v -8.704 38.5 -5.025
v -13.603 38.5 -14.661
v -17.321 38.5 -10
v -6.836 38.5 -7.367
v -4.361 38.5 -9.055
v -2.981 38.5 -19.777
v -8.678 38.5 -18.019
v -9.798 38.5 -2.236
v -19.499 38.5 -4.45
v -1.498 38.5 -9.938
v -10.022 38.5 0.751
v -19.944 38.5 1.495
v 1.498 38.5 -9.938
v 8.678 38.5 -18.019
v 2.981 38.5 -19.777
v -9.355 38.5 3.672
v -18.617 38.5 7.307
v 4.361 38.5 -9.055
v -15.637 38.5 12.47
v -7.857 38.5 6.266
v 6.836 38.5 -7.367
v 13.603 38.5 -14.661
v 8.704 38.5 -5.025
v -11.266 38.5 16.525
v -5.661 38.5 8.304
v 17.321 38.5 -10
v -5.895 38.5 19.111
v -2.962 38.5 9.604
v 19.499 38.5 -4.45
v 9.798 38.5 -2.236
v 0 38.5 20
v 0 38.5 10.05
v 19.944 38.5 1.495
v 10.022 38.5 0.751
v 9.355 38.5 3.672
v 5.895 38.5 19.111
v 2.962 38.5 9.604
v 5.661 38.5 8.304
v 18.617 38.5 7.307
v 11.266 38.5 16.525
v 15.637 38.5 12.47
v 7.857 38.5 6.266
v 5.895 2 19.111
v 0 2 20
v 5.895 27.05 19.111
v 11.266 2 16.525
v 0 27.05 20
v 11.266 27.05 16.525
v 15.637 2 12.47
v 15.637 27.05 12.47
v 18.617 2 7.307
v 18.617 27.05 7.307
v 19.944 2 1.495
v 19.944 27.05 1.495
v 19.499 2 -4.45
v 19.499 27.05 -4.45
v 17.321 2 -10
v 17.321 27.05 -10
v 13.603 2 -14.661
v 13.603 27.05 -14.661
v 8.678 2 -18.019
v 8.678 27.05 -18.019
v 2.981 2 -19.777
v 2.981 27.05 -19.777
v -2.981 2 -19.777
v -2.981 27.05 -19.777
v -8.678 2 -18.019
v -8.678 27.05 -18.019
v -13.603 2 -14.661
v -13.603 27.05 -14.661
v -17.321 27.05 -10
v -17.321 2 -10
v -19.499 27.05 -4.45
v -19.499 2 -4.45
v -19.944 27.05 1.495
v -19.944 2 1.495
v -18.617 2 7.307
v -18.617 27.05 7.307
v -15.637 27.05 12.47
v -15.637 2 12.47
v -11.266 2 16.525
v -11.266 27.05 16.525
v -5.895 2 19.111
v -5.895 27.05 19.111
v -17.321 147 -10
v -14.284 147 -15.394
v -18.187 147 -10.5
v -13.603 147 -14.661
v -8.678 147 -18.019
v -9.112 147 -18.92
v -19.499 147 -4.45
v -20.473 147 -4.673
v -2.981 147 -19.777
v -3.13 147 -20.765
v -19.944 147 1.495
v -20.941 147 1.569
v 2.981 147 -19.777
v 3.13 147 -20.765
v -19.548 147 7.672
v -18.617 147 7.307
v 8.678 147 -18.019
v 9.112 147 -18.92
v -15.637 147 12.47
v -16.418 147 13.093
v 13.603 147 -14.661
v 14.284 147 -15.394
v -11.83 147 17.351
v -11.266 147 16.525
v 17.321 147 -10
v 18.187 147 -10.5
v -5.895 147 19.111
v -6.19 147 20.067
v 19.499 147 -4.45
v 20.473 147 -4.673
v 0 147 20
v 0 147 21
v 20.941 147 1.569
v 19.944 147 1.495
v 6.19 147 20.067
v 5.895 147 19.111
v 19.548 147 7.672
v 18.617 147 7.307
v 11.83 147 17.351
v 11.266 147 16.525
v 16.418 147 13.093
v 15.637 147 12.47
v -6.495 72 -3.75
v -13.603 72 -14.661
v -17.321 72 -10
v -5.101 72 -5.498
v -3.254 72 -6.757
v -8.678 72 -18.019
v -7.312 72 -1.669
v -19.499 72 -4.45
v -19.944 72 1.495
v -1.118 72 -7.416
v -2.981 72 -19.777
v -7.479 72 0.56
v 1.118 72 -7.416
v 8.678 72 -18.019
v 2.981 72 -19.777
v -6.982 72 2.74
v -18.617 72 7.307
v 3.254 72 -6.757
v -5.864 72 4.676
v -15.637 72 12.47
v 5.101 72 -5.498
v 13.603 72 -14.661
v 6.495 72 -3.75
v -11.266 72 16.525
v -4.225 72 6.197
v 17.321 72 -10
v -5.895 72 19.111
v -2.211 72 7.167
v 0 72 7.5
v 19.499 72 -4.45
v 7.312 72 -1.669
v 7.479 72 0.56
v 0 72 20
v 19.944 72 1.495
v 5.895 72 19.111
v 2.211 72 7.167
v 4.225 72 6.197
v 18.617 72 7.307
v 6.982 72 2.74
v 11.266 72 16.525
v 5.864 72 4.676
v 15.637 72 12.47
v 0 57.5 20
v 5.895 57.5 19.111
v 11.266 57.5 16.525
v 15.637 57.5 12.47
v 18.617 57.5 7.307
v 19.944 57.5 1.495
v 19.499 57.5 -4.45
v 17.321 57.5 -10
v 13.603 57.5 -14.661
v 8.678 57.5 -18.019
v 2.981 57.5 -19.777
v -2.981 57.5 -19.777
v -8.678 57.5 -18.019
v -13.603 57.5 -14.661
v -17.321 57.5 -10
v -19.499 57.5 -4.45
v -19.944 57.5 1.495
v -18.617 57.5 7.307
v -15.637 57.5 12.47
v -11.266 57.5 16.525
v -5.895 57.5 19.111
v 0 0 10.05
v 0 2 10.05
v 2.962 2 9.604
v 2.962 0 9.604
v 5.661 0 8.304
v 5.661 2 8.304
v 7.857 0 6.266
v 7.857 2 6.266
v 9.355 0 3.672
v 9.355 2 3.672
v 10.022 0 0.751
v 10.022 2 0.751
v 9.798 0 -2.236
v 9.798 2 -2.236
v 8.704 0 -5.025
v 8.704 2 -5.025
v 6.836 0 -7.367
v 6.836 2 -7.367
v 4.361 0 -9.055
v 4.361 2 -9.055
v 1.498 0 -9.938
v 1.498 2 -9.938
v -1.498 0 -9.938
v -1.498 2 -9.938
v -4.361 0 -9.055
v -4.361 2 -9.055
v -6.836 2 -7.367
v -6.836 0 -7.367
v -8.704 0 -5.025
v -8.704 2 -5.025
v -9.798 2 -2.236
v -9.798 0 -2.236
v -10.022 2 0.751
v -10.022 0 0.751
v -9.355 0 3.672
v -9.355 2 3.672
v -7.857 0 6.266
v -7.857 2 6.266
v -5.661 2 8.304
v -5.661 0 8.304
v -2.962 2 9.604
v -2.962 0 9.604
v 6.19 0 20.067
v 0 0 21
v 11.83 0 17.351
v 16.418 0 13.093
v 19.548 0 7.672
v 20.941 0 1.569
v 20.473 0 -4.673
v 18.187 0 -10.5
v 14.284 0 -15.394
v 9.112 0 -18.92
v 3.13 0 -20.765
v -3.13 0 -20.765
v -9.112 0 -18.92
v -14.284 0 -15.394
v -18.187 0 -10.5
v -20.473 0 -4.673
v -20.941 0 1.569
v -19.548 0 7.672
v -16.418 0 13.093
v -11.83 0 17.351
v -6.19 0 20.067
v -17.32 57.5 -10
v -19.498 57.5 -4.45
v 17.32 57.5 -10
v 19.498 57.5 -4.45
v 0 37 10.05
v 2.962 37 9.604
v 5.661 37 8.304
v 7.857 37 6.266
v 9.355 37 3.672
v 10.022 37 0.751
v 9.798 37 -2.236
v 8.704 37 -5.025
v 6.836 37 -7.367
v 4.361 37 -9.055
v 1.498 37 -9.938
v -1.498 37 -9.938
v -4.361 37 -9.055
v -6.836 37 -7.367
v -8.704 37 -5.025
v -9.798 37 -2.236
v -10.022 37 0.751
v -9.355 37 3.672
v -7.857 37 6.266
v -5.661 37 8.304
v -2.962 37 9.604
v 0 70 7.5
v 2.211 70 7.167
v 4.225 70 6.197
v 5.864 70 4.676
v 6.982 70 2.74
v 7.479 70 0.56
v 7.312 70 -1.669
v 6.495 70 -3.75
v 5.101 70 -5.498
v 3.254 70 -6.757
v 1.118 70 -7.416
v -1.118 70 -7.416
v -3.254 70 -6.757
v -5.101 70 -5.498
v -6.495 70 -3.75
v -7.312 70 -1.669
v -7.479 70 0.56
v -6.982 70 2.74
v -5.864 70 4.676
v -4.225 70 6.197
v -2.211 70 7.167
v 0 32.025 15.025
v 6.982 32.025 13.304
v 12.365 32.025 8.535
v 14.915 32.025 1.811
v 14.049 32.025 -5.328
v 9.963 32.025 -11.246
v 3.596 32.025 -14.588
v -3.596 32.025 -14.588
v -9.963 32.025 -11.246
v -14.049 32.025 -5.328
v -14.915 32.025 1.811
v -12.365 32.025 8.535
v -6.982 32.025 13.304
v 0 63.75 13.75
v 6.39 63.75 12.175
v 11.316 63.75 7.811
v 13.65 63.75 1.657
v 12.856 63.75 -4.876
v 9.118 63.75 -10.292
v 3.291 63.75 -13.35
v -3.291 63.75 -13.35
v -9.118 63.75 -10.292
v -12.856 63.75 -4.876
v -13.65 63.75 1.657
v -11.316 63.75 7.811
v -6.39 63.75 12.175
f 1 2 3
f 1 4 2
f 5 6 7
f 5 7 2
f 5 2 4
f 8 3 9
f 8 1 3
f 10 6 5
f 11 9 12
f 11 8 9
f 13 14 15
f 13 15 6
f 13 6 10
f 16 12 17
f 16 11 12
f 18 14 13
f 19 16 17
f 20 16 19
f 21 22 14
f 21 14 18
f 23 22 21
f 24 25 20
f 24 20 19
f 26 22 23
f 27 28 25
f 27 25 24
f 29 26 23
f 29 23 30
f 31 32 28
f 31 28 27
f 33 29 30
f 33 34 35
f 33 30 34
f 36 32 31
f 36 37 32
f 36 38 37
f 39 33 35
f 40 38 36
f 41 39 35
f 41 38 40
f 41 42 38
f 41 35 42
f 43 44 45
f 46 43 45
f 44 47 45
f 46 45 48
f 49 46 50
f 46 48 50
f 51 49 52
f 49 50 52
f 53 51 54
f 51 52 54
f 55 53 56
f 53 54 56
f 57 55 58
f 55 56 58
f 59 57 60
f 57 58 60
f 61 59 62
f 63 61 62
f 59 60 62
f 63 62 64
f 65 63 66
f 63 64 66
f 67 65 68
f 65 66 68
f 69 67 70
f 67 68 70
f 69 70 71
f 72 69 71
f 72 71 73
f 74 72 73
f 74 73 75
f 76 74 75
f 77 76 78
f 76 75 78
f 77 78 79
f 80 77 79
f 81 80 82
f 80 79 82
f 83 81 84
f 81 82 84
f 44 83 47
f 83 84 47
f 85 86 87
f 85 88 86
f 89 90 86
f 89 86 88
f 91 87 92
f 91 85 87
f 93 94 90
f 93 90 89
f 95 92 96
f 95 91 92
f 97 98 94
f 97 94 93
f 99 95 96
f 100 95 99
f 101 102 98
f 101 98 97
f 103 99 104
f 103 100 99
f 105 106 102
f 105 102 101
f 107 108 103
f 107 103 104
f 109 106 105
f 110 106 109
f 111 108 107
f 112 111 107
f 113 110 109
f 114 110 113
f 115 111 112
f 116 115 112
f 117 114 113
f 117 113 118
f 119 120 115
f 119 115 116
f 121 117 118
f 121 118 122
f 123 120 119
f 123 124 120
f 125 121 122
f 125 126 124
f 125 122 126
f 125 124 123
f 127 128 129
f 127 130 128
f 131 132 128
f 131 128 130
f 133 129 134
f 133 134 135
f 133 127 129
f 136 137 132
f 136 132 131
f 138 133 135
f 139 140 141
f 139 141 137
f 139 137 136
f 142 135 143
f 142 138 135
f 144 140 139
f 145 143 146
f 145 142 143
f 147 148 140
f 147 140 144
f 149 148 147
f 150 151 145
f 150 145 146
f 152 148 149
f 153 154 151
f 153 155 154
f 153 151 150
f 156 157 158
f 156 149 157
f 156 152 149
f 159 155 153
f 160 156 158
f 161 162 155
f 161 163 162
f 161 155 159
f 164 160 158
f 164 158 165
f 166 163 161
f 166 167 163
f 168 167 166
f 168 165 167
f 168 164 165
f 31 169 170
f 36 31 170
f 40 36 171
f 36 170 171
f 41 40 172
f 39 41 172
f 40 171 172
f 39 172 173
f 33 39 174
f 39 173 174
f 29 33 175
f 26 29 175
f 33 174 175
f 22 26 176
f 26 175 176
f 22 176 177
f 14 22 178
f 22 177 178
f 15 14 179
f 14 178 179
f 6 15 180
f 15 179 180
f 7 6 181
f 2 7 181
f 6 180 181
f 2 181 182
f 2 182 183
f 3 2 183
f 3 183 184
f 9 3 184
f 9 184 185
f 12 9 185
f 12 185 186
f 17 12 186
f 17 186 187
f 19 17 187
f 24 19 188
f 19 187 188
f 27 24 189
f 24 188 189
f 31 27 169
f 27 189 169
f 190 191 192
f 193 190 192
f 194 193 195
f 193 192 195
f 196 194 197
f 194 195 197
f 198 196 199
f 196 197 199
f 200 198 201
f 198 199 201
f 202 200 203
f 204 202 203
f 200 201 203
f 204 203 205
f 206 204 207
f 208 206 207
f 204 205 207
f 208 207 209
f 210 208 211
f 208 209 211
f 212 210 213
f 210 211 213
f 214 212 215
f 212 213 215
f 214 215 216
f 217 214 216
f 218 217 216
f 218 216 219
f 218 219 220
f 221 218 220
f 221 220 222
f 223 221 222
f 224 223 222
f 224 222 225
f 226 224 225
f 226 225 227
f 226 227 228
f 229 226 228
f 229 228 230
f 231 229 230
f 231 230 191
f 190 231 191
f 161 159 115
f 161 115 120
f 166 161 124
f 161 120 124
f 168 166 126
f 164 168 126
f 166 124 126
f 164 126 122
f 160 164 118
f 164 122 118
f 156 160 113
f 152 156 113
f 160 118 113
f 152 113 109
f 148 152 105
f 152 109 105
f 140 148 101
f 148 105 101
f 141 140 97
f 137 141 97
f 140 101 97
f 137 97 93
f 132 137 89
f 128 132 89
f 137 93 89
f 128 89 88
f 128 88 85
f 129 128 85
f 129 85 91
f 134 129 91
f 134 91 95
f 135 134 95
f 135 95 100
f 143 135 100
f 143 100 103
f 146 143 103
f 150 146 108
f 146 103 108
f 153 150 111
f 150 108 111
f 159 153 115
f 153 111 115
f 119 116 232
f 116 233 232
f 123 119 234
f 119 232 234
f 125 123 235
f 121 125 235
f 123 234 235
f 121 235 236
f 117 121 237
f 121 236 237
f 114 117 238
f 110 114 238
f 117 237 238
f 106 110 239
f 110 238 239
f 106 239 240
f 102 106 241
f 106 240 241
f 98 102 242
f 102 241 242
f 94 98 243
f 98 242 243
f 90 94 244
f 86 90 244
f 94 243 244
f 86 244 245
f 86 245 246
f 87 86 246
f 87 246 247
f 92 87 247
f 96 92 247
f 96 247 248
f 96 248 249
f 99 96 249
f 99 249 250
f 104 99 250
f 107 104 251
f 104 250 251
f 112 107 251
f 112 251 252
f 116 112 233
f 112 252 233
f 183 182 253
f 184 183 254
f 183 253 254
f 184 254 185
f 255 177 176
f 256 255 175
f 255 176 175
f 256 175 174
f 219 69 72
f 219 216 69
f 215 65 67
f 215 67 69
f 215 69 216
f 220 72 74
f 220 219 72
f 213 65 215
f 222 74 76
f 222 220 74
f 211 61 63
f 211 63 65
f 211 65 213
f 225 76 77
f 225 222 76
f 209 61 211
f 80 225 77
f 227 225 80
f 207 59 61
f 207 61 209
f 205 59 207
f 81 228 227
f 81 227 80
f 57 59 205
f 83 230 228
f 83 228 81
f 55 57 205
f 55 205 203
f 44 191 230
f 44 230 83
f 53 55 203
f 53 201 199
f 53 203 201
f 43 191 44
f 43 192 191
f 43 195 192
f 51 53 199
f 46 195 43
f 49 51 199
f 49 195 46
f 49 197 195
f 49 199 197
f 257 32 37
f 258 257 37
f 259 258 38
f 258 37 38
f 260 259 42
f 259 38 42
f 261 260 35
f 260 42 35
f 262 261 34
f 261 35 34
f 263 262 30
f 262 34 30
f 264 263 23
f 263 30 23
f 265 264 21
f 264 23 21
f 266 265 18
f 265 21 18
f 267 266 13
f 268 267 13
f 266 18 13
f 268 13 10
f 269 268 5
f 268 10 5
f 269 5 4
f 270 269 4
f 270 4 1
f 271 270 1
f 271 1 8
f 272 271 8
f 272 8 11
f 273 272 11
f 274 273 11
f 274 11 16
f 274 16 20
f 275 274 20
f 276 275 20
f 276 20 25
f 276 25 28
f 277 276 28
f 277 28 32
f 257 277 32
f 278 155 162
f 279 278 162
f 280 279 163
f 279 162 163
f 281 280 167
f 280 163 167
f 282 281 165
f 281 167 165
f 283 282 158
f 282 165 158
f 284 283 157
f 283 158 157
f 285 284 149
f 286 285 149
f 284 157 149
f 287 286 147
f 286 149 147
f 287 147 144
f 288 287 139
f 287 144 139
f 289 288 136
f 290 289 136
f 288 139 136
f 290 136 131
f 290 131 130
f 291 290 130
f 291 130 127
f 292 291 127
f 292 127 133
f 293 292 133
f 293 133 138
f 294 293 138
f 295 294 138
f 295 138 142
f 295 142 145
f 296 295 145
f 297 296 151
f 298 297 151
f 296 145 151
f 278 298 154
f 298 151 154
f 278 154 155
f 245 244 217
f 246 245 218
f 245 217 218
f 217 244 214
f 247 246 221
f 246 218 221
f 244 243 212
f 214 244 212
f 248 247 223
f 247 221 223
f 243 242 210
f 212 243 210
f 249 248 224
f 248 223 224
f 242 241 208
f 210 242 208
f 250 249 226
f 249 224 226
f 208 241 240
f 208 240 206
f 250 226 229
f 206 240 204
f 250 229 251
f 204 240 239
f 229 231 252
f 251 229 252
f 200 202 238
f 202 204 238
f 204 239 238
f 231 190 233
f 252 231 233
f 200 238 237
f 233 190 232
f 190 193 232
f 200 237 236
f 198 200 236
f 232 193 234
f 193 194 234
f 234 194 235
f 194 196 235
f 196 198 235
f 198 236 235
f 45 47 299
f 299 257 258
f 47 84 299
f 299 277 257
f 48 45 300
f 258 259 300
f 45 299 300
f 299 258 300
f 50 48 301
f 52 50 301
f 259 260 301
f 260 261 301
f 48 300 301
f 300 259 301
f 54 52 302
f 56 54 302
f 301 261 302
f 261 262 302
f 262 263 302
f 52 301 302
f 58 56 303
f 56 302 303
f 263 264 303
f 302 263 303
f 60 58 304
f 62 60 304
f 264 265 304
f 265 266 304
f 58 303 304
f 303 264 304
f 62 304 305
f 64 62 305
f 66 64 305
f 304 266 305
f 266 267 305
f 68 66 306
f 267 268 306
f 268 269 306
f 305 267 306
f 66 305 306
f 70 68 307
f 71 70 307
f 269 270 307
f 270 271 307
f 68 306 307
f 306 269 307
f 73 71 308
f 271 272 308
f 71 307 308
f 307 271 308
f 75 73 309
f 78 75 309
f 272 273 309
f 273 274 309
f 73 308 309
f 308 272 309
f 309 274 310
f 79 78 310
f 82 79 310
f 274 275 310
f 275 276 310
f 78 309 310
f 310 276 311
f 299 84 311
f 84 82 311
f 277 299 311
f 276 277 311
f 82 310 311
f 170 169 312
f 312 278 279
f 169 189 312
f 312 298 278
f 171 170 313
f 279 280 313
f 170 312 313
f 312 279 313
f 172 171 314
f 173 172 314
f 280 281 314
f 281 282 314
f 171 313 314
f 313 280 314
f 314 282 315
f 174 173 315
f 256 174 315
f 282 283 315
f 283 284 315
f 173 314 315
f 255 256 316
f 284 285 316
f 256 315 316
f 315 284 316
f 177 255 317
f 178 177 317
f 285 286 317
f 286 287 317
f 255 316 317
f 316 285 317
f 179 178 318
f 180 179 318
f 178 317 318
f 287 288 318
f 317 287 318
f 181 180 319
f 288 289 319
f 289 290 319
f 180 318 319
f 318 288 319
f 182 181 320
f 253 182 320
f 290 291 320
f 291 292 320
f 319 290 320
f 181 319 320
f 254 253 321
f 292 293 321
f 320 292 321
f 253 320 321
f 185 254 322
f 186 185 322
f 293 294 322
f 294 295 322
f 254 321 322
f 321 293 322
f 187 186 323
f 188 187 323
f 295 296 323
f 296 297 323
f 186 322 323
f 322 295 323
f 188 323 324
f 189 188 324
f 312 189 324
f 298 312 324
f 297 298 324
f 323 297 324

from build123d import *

# Parameters (mm, degrees)
SKETCH3_R           = 21
BOSS_EXTRUDE2_DEPTH = 2
SKETCH4_R           = 10.05
CUT_EXTRUDE2_DEPTH  = 12.5
SKETCH5_R           = 21
BOSS_EXTRUDE3_DEPTH = 24
SKETCH6_R           = 20
CUT_EXTRUDE3_DEPTH  = 24
SKETCH7_R           = 21
BOSS_EXTRUDE4_DEPTH = 12.5
SKETCH8_R           = 10.05
CUT_EXTRUDE4_DEPTH  = 12.5
SKETCH9_R           = 21
BOSS_EXTRUDE5_DEPTH = 19
SKETCH10_R          = 20
CUT_EXTRUDE5_DEPTH  = 19
SKETCH11_R          = 21
BOSS_EXTRUDE6_DEPTH = 14.5
SKETCH12_R          = 7.5
CUT_EXTRUDE6_DEPTH  = 14.5
SKETCH13_R          = 21
BOSS_EXTRUDE7_DEPTH = 75
SKETCH14_R          = 20
CUT_EXTRUDE7_DEPTH  = 75
CHAMFER7_SIZE       = 11
CHAMFER8_SIZE       = 12.5


# Some blends are built 0.0001 mm under size
with BuildPart() as part:
    # Sketch3 → Boss-Extrude2 (new body)
    with BuildSketch(Plane(origin=(0, 0, 0), x_dir=(1, 0, 0), z_dir=(0, 1, 0))):
        with Locations(Location((0, 0, 0), (0, 0, 270))):
            Circle(SKETCH3_R)
    extrude(amount=BOSS_EXTRUDE2_DEPTH)

    # Sketch4 → Cut-Extrude2 (cut)
    with BuildSketch(Plane(origin=(0, 2, 0), x_dir=(1, 0, 0), z_dir=(0, 1, 0))):
        with Locations(Location((0, 0, 0), (0, 0, 270))):
            Circle(SKETCH4_R)
    extrude(amount=-CUT_EXTRUDE2_DEPTH, mode=Mode.SUBTRACT)

    # Sketch5 → Boss-Extrude3 (add)
    with BuildSketch(Plane(origin=(0, 2, 0), x_dir=(1, 0, 0), z_dir=(0, 1, 0))):
        with Locations(Location((0, 0, 0), (0, 0, 270))):
            Circle(SKETCH5_R)
    extrude(amount=BOSS_EXTRUDE3_DEPTH)

    # Sketch6 → Cut-Extrude3 (cut)
    with BuildSketch(Plane(origin=(0, 26, 0), x_dir=(1, 0, 0), z_dir=(0, 1, 0))):
        with Locations(Location((0, 0, 0), (0, 0, 270))):
            Circle(SKETCH6_R)
    extrude(amount=-CUT_EXTRUDE3_DEPTH, mode=Mode.SUBTRACT)

    # Sketch7 → Boss-Extrude4 (add)
    with BuildSketch(Plane(origin=(0, 26, 0), x_dir=(1, 0, 0), z_dir=(0, 1, 0))):
        with Locations(Location((0, 0, 0), (0, 0, 270))):
            Circle(SKETCH7_R)
    extrude(amount=BOSS_EXTRUDE4_DEPTH)

    # Sketch8 → Cut-Extrude4 (cut)
    with BuildSketch(Plane(origin=(0, 38.5, 0), x_dir=(1, 0, 0), z_dir=(0, 1, 0))):
        with Locations(Location((0, 0, 0), (0, 0, 270))):
            Circle(SKETCH8_R)
    extrude(amount=-CUT_EXTRUDE4_DEPTH, mode=Mode.SUBTRACT)

    # Sketch9 → Boss-Extrude5 (add)
    with BuildSketch(Plane(origin=(0, 38.5, 0), x_dir=(1, 0, 0), z_dir=(0, 1, 0))):
        with Locations(Location((0, 0, 0), (0, 0, 270))):
            Circle(SKETCH9_R)
    extrude(amount=BOSS_EXTRUDE5_DEPTH)

    # Sketch10 → Cut-Extrude5 (cut)
    with BuildSketch(Plane(origin=(0, 57.5, 0), x_dir=(1, 0, 0), z_dir=(0, 1, 0))):
        with Locations(Location((0, 0, 0), (0, 0, 270))):
            Circle(SKETCH10_R)
    extrude(amount=-CUT_EXTRUDE5_DEPTH, mode=Mode.SUBTRACT)

    # Sketch11 → Boss-Extrude6 (add)
    with BuildSketch(Plane(origin=(0, 57.5, 0), x_dir=(1, 0, 0), z_dir=(0, 1, 0))):
        with Locations(Location((0, 0, 0), (0, 0, 270))):
            Circle(SKETCH11_R)
    extrude(amount=BOSS_EXTRUDE6_DEPTH)

    # Sketch12 → Cut-Extrude6 (cut)
    with BuildSketch(Plane(origin=(0, 72, 0), x_dir=(1, 0, 0), z_dir=(0, 1, 0))):
        with Locations(Location((0, 0, 0), (0, 0, 270))):
            Circle(SKETCH12_R)
    extrude(amount=-CUT_EXTRUDE6_DEPTH, mode=Mode.SUBTRACT)

    # Sketch13 → Boss-Extrude7 (add)
    with BuildSketch(Plane(origin=(0, 72, 0), x_dir=(1, 0, 0), z_dir=(0, 1, 0))):
        with Locations(Location((0, 0, 0), (0, 0, 270))):
            Circle(SKETCH13_R)
    extrude(amount=BOSS_EXTRUDE7_DEPTH)

    # Sketch14 → Cut-Extrude7 (cut)
    with BuildSketch(Plane(origin=(0, 147, 0), x_dir=(1, 0, 0), z_dir=(0, 1, 0))):
        with Locations(Location((0, 0, 0), (0, 0, 270))):
            Circle(SKETCH14_R)
    extrude(amount=-CUT_EXTRUDE7_DEPTH, mode=Mode.SUBTRACT)

    # Chamfer7
    # the kernel refuses this chamfer: 11 mm, written as the material it takes off along each edge
    with BuildSketch(Plane(origin=(0, 26, 0), x_dir=(0, 0, 1), z_dir=(-1, 0, 0))) as chamfer7_piece_1_section:
        Polygon((10.05 + CHAMFER7_SIZE, 0), (10.05, CHAMFER7_SIZE), (10.05, 0), align=None)
    chamfer7_piece_1 = revolve(axis=Axis((0, 26, 0), (0, 1, 0)), mode=Mode.PRIVATE)
    chamfer7_piece_1 = chamfer7_piece_1 & Plane(origin=(0, 32.05519731, 0), x_dir=(0, 0, 1), z_dir=(0, 1, 0)) * Cylinder(20, 85, mode=Mode.PRIVATE)
    add(chamfer7_piece_1, mode=Mode.SUBTRACT)

    # Chamfer8
    chamfer8_edges = [part.edges().sort_by_distance(p)[0] for p in [
        (0, 57.5, -7.5),
    ]]
    chamfer(chamfer8_edges, length=CHAMFER8_SIZE - 0.0001)  # a hair under: the kernel refuses the full size


solid = part.part
